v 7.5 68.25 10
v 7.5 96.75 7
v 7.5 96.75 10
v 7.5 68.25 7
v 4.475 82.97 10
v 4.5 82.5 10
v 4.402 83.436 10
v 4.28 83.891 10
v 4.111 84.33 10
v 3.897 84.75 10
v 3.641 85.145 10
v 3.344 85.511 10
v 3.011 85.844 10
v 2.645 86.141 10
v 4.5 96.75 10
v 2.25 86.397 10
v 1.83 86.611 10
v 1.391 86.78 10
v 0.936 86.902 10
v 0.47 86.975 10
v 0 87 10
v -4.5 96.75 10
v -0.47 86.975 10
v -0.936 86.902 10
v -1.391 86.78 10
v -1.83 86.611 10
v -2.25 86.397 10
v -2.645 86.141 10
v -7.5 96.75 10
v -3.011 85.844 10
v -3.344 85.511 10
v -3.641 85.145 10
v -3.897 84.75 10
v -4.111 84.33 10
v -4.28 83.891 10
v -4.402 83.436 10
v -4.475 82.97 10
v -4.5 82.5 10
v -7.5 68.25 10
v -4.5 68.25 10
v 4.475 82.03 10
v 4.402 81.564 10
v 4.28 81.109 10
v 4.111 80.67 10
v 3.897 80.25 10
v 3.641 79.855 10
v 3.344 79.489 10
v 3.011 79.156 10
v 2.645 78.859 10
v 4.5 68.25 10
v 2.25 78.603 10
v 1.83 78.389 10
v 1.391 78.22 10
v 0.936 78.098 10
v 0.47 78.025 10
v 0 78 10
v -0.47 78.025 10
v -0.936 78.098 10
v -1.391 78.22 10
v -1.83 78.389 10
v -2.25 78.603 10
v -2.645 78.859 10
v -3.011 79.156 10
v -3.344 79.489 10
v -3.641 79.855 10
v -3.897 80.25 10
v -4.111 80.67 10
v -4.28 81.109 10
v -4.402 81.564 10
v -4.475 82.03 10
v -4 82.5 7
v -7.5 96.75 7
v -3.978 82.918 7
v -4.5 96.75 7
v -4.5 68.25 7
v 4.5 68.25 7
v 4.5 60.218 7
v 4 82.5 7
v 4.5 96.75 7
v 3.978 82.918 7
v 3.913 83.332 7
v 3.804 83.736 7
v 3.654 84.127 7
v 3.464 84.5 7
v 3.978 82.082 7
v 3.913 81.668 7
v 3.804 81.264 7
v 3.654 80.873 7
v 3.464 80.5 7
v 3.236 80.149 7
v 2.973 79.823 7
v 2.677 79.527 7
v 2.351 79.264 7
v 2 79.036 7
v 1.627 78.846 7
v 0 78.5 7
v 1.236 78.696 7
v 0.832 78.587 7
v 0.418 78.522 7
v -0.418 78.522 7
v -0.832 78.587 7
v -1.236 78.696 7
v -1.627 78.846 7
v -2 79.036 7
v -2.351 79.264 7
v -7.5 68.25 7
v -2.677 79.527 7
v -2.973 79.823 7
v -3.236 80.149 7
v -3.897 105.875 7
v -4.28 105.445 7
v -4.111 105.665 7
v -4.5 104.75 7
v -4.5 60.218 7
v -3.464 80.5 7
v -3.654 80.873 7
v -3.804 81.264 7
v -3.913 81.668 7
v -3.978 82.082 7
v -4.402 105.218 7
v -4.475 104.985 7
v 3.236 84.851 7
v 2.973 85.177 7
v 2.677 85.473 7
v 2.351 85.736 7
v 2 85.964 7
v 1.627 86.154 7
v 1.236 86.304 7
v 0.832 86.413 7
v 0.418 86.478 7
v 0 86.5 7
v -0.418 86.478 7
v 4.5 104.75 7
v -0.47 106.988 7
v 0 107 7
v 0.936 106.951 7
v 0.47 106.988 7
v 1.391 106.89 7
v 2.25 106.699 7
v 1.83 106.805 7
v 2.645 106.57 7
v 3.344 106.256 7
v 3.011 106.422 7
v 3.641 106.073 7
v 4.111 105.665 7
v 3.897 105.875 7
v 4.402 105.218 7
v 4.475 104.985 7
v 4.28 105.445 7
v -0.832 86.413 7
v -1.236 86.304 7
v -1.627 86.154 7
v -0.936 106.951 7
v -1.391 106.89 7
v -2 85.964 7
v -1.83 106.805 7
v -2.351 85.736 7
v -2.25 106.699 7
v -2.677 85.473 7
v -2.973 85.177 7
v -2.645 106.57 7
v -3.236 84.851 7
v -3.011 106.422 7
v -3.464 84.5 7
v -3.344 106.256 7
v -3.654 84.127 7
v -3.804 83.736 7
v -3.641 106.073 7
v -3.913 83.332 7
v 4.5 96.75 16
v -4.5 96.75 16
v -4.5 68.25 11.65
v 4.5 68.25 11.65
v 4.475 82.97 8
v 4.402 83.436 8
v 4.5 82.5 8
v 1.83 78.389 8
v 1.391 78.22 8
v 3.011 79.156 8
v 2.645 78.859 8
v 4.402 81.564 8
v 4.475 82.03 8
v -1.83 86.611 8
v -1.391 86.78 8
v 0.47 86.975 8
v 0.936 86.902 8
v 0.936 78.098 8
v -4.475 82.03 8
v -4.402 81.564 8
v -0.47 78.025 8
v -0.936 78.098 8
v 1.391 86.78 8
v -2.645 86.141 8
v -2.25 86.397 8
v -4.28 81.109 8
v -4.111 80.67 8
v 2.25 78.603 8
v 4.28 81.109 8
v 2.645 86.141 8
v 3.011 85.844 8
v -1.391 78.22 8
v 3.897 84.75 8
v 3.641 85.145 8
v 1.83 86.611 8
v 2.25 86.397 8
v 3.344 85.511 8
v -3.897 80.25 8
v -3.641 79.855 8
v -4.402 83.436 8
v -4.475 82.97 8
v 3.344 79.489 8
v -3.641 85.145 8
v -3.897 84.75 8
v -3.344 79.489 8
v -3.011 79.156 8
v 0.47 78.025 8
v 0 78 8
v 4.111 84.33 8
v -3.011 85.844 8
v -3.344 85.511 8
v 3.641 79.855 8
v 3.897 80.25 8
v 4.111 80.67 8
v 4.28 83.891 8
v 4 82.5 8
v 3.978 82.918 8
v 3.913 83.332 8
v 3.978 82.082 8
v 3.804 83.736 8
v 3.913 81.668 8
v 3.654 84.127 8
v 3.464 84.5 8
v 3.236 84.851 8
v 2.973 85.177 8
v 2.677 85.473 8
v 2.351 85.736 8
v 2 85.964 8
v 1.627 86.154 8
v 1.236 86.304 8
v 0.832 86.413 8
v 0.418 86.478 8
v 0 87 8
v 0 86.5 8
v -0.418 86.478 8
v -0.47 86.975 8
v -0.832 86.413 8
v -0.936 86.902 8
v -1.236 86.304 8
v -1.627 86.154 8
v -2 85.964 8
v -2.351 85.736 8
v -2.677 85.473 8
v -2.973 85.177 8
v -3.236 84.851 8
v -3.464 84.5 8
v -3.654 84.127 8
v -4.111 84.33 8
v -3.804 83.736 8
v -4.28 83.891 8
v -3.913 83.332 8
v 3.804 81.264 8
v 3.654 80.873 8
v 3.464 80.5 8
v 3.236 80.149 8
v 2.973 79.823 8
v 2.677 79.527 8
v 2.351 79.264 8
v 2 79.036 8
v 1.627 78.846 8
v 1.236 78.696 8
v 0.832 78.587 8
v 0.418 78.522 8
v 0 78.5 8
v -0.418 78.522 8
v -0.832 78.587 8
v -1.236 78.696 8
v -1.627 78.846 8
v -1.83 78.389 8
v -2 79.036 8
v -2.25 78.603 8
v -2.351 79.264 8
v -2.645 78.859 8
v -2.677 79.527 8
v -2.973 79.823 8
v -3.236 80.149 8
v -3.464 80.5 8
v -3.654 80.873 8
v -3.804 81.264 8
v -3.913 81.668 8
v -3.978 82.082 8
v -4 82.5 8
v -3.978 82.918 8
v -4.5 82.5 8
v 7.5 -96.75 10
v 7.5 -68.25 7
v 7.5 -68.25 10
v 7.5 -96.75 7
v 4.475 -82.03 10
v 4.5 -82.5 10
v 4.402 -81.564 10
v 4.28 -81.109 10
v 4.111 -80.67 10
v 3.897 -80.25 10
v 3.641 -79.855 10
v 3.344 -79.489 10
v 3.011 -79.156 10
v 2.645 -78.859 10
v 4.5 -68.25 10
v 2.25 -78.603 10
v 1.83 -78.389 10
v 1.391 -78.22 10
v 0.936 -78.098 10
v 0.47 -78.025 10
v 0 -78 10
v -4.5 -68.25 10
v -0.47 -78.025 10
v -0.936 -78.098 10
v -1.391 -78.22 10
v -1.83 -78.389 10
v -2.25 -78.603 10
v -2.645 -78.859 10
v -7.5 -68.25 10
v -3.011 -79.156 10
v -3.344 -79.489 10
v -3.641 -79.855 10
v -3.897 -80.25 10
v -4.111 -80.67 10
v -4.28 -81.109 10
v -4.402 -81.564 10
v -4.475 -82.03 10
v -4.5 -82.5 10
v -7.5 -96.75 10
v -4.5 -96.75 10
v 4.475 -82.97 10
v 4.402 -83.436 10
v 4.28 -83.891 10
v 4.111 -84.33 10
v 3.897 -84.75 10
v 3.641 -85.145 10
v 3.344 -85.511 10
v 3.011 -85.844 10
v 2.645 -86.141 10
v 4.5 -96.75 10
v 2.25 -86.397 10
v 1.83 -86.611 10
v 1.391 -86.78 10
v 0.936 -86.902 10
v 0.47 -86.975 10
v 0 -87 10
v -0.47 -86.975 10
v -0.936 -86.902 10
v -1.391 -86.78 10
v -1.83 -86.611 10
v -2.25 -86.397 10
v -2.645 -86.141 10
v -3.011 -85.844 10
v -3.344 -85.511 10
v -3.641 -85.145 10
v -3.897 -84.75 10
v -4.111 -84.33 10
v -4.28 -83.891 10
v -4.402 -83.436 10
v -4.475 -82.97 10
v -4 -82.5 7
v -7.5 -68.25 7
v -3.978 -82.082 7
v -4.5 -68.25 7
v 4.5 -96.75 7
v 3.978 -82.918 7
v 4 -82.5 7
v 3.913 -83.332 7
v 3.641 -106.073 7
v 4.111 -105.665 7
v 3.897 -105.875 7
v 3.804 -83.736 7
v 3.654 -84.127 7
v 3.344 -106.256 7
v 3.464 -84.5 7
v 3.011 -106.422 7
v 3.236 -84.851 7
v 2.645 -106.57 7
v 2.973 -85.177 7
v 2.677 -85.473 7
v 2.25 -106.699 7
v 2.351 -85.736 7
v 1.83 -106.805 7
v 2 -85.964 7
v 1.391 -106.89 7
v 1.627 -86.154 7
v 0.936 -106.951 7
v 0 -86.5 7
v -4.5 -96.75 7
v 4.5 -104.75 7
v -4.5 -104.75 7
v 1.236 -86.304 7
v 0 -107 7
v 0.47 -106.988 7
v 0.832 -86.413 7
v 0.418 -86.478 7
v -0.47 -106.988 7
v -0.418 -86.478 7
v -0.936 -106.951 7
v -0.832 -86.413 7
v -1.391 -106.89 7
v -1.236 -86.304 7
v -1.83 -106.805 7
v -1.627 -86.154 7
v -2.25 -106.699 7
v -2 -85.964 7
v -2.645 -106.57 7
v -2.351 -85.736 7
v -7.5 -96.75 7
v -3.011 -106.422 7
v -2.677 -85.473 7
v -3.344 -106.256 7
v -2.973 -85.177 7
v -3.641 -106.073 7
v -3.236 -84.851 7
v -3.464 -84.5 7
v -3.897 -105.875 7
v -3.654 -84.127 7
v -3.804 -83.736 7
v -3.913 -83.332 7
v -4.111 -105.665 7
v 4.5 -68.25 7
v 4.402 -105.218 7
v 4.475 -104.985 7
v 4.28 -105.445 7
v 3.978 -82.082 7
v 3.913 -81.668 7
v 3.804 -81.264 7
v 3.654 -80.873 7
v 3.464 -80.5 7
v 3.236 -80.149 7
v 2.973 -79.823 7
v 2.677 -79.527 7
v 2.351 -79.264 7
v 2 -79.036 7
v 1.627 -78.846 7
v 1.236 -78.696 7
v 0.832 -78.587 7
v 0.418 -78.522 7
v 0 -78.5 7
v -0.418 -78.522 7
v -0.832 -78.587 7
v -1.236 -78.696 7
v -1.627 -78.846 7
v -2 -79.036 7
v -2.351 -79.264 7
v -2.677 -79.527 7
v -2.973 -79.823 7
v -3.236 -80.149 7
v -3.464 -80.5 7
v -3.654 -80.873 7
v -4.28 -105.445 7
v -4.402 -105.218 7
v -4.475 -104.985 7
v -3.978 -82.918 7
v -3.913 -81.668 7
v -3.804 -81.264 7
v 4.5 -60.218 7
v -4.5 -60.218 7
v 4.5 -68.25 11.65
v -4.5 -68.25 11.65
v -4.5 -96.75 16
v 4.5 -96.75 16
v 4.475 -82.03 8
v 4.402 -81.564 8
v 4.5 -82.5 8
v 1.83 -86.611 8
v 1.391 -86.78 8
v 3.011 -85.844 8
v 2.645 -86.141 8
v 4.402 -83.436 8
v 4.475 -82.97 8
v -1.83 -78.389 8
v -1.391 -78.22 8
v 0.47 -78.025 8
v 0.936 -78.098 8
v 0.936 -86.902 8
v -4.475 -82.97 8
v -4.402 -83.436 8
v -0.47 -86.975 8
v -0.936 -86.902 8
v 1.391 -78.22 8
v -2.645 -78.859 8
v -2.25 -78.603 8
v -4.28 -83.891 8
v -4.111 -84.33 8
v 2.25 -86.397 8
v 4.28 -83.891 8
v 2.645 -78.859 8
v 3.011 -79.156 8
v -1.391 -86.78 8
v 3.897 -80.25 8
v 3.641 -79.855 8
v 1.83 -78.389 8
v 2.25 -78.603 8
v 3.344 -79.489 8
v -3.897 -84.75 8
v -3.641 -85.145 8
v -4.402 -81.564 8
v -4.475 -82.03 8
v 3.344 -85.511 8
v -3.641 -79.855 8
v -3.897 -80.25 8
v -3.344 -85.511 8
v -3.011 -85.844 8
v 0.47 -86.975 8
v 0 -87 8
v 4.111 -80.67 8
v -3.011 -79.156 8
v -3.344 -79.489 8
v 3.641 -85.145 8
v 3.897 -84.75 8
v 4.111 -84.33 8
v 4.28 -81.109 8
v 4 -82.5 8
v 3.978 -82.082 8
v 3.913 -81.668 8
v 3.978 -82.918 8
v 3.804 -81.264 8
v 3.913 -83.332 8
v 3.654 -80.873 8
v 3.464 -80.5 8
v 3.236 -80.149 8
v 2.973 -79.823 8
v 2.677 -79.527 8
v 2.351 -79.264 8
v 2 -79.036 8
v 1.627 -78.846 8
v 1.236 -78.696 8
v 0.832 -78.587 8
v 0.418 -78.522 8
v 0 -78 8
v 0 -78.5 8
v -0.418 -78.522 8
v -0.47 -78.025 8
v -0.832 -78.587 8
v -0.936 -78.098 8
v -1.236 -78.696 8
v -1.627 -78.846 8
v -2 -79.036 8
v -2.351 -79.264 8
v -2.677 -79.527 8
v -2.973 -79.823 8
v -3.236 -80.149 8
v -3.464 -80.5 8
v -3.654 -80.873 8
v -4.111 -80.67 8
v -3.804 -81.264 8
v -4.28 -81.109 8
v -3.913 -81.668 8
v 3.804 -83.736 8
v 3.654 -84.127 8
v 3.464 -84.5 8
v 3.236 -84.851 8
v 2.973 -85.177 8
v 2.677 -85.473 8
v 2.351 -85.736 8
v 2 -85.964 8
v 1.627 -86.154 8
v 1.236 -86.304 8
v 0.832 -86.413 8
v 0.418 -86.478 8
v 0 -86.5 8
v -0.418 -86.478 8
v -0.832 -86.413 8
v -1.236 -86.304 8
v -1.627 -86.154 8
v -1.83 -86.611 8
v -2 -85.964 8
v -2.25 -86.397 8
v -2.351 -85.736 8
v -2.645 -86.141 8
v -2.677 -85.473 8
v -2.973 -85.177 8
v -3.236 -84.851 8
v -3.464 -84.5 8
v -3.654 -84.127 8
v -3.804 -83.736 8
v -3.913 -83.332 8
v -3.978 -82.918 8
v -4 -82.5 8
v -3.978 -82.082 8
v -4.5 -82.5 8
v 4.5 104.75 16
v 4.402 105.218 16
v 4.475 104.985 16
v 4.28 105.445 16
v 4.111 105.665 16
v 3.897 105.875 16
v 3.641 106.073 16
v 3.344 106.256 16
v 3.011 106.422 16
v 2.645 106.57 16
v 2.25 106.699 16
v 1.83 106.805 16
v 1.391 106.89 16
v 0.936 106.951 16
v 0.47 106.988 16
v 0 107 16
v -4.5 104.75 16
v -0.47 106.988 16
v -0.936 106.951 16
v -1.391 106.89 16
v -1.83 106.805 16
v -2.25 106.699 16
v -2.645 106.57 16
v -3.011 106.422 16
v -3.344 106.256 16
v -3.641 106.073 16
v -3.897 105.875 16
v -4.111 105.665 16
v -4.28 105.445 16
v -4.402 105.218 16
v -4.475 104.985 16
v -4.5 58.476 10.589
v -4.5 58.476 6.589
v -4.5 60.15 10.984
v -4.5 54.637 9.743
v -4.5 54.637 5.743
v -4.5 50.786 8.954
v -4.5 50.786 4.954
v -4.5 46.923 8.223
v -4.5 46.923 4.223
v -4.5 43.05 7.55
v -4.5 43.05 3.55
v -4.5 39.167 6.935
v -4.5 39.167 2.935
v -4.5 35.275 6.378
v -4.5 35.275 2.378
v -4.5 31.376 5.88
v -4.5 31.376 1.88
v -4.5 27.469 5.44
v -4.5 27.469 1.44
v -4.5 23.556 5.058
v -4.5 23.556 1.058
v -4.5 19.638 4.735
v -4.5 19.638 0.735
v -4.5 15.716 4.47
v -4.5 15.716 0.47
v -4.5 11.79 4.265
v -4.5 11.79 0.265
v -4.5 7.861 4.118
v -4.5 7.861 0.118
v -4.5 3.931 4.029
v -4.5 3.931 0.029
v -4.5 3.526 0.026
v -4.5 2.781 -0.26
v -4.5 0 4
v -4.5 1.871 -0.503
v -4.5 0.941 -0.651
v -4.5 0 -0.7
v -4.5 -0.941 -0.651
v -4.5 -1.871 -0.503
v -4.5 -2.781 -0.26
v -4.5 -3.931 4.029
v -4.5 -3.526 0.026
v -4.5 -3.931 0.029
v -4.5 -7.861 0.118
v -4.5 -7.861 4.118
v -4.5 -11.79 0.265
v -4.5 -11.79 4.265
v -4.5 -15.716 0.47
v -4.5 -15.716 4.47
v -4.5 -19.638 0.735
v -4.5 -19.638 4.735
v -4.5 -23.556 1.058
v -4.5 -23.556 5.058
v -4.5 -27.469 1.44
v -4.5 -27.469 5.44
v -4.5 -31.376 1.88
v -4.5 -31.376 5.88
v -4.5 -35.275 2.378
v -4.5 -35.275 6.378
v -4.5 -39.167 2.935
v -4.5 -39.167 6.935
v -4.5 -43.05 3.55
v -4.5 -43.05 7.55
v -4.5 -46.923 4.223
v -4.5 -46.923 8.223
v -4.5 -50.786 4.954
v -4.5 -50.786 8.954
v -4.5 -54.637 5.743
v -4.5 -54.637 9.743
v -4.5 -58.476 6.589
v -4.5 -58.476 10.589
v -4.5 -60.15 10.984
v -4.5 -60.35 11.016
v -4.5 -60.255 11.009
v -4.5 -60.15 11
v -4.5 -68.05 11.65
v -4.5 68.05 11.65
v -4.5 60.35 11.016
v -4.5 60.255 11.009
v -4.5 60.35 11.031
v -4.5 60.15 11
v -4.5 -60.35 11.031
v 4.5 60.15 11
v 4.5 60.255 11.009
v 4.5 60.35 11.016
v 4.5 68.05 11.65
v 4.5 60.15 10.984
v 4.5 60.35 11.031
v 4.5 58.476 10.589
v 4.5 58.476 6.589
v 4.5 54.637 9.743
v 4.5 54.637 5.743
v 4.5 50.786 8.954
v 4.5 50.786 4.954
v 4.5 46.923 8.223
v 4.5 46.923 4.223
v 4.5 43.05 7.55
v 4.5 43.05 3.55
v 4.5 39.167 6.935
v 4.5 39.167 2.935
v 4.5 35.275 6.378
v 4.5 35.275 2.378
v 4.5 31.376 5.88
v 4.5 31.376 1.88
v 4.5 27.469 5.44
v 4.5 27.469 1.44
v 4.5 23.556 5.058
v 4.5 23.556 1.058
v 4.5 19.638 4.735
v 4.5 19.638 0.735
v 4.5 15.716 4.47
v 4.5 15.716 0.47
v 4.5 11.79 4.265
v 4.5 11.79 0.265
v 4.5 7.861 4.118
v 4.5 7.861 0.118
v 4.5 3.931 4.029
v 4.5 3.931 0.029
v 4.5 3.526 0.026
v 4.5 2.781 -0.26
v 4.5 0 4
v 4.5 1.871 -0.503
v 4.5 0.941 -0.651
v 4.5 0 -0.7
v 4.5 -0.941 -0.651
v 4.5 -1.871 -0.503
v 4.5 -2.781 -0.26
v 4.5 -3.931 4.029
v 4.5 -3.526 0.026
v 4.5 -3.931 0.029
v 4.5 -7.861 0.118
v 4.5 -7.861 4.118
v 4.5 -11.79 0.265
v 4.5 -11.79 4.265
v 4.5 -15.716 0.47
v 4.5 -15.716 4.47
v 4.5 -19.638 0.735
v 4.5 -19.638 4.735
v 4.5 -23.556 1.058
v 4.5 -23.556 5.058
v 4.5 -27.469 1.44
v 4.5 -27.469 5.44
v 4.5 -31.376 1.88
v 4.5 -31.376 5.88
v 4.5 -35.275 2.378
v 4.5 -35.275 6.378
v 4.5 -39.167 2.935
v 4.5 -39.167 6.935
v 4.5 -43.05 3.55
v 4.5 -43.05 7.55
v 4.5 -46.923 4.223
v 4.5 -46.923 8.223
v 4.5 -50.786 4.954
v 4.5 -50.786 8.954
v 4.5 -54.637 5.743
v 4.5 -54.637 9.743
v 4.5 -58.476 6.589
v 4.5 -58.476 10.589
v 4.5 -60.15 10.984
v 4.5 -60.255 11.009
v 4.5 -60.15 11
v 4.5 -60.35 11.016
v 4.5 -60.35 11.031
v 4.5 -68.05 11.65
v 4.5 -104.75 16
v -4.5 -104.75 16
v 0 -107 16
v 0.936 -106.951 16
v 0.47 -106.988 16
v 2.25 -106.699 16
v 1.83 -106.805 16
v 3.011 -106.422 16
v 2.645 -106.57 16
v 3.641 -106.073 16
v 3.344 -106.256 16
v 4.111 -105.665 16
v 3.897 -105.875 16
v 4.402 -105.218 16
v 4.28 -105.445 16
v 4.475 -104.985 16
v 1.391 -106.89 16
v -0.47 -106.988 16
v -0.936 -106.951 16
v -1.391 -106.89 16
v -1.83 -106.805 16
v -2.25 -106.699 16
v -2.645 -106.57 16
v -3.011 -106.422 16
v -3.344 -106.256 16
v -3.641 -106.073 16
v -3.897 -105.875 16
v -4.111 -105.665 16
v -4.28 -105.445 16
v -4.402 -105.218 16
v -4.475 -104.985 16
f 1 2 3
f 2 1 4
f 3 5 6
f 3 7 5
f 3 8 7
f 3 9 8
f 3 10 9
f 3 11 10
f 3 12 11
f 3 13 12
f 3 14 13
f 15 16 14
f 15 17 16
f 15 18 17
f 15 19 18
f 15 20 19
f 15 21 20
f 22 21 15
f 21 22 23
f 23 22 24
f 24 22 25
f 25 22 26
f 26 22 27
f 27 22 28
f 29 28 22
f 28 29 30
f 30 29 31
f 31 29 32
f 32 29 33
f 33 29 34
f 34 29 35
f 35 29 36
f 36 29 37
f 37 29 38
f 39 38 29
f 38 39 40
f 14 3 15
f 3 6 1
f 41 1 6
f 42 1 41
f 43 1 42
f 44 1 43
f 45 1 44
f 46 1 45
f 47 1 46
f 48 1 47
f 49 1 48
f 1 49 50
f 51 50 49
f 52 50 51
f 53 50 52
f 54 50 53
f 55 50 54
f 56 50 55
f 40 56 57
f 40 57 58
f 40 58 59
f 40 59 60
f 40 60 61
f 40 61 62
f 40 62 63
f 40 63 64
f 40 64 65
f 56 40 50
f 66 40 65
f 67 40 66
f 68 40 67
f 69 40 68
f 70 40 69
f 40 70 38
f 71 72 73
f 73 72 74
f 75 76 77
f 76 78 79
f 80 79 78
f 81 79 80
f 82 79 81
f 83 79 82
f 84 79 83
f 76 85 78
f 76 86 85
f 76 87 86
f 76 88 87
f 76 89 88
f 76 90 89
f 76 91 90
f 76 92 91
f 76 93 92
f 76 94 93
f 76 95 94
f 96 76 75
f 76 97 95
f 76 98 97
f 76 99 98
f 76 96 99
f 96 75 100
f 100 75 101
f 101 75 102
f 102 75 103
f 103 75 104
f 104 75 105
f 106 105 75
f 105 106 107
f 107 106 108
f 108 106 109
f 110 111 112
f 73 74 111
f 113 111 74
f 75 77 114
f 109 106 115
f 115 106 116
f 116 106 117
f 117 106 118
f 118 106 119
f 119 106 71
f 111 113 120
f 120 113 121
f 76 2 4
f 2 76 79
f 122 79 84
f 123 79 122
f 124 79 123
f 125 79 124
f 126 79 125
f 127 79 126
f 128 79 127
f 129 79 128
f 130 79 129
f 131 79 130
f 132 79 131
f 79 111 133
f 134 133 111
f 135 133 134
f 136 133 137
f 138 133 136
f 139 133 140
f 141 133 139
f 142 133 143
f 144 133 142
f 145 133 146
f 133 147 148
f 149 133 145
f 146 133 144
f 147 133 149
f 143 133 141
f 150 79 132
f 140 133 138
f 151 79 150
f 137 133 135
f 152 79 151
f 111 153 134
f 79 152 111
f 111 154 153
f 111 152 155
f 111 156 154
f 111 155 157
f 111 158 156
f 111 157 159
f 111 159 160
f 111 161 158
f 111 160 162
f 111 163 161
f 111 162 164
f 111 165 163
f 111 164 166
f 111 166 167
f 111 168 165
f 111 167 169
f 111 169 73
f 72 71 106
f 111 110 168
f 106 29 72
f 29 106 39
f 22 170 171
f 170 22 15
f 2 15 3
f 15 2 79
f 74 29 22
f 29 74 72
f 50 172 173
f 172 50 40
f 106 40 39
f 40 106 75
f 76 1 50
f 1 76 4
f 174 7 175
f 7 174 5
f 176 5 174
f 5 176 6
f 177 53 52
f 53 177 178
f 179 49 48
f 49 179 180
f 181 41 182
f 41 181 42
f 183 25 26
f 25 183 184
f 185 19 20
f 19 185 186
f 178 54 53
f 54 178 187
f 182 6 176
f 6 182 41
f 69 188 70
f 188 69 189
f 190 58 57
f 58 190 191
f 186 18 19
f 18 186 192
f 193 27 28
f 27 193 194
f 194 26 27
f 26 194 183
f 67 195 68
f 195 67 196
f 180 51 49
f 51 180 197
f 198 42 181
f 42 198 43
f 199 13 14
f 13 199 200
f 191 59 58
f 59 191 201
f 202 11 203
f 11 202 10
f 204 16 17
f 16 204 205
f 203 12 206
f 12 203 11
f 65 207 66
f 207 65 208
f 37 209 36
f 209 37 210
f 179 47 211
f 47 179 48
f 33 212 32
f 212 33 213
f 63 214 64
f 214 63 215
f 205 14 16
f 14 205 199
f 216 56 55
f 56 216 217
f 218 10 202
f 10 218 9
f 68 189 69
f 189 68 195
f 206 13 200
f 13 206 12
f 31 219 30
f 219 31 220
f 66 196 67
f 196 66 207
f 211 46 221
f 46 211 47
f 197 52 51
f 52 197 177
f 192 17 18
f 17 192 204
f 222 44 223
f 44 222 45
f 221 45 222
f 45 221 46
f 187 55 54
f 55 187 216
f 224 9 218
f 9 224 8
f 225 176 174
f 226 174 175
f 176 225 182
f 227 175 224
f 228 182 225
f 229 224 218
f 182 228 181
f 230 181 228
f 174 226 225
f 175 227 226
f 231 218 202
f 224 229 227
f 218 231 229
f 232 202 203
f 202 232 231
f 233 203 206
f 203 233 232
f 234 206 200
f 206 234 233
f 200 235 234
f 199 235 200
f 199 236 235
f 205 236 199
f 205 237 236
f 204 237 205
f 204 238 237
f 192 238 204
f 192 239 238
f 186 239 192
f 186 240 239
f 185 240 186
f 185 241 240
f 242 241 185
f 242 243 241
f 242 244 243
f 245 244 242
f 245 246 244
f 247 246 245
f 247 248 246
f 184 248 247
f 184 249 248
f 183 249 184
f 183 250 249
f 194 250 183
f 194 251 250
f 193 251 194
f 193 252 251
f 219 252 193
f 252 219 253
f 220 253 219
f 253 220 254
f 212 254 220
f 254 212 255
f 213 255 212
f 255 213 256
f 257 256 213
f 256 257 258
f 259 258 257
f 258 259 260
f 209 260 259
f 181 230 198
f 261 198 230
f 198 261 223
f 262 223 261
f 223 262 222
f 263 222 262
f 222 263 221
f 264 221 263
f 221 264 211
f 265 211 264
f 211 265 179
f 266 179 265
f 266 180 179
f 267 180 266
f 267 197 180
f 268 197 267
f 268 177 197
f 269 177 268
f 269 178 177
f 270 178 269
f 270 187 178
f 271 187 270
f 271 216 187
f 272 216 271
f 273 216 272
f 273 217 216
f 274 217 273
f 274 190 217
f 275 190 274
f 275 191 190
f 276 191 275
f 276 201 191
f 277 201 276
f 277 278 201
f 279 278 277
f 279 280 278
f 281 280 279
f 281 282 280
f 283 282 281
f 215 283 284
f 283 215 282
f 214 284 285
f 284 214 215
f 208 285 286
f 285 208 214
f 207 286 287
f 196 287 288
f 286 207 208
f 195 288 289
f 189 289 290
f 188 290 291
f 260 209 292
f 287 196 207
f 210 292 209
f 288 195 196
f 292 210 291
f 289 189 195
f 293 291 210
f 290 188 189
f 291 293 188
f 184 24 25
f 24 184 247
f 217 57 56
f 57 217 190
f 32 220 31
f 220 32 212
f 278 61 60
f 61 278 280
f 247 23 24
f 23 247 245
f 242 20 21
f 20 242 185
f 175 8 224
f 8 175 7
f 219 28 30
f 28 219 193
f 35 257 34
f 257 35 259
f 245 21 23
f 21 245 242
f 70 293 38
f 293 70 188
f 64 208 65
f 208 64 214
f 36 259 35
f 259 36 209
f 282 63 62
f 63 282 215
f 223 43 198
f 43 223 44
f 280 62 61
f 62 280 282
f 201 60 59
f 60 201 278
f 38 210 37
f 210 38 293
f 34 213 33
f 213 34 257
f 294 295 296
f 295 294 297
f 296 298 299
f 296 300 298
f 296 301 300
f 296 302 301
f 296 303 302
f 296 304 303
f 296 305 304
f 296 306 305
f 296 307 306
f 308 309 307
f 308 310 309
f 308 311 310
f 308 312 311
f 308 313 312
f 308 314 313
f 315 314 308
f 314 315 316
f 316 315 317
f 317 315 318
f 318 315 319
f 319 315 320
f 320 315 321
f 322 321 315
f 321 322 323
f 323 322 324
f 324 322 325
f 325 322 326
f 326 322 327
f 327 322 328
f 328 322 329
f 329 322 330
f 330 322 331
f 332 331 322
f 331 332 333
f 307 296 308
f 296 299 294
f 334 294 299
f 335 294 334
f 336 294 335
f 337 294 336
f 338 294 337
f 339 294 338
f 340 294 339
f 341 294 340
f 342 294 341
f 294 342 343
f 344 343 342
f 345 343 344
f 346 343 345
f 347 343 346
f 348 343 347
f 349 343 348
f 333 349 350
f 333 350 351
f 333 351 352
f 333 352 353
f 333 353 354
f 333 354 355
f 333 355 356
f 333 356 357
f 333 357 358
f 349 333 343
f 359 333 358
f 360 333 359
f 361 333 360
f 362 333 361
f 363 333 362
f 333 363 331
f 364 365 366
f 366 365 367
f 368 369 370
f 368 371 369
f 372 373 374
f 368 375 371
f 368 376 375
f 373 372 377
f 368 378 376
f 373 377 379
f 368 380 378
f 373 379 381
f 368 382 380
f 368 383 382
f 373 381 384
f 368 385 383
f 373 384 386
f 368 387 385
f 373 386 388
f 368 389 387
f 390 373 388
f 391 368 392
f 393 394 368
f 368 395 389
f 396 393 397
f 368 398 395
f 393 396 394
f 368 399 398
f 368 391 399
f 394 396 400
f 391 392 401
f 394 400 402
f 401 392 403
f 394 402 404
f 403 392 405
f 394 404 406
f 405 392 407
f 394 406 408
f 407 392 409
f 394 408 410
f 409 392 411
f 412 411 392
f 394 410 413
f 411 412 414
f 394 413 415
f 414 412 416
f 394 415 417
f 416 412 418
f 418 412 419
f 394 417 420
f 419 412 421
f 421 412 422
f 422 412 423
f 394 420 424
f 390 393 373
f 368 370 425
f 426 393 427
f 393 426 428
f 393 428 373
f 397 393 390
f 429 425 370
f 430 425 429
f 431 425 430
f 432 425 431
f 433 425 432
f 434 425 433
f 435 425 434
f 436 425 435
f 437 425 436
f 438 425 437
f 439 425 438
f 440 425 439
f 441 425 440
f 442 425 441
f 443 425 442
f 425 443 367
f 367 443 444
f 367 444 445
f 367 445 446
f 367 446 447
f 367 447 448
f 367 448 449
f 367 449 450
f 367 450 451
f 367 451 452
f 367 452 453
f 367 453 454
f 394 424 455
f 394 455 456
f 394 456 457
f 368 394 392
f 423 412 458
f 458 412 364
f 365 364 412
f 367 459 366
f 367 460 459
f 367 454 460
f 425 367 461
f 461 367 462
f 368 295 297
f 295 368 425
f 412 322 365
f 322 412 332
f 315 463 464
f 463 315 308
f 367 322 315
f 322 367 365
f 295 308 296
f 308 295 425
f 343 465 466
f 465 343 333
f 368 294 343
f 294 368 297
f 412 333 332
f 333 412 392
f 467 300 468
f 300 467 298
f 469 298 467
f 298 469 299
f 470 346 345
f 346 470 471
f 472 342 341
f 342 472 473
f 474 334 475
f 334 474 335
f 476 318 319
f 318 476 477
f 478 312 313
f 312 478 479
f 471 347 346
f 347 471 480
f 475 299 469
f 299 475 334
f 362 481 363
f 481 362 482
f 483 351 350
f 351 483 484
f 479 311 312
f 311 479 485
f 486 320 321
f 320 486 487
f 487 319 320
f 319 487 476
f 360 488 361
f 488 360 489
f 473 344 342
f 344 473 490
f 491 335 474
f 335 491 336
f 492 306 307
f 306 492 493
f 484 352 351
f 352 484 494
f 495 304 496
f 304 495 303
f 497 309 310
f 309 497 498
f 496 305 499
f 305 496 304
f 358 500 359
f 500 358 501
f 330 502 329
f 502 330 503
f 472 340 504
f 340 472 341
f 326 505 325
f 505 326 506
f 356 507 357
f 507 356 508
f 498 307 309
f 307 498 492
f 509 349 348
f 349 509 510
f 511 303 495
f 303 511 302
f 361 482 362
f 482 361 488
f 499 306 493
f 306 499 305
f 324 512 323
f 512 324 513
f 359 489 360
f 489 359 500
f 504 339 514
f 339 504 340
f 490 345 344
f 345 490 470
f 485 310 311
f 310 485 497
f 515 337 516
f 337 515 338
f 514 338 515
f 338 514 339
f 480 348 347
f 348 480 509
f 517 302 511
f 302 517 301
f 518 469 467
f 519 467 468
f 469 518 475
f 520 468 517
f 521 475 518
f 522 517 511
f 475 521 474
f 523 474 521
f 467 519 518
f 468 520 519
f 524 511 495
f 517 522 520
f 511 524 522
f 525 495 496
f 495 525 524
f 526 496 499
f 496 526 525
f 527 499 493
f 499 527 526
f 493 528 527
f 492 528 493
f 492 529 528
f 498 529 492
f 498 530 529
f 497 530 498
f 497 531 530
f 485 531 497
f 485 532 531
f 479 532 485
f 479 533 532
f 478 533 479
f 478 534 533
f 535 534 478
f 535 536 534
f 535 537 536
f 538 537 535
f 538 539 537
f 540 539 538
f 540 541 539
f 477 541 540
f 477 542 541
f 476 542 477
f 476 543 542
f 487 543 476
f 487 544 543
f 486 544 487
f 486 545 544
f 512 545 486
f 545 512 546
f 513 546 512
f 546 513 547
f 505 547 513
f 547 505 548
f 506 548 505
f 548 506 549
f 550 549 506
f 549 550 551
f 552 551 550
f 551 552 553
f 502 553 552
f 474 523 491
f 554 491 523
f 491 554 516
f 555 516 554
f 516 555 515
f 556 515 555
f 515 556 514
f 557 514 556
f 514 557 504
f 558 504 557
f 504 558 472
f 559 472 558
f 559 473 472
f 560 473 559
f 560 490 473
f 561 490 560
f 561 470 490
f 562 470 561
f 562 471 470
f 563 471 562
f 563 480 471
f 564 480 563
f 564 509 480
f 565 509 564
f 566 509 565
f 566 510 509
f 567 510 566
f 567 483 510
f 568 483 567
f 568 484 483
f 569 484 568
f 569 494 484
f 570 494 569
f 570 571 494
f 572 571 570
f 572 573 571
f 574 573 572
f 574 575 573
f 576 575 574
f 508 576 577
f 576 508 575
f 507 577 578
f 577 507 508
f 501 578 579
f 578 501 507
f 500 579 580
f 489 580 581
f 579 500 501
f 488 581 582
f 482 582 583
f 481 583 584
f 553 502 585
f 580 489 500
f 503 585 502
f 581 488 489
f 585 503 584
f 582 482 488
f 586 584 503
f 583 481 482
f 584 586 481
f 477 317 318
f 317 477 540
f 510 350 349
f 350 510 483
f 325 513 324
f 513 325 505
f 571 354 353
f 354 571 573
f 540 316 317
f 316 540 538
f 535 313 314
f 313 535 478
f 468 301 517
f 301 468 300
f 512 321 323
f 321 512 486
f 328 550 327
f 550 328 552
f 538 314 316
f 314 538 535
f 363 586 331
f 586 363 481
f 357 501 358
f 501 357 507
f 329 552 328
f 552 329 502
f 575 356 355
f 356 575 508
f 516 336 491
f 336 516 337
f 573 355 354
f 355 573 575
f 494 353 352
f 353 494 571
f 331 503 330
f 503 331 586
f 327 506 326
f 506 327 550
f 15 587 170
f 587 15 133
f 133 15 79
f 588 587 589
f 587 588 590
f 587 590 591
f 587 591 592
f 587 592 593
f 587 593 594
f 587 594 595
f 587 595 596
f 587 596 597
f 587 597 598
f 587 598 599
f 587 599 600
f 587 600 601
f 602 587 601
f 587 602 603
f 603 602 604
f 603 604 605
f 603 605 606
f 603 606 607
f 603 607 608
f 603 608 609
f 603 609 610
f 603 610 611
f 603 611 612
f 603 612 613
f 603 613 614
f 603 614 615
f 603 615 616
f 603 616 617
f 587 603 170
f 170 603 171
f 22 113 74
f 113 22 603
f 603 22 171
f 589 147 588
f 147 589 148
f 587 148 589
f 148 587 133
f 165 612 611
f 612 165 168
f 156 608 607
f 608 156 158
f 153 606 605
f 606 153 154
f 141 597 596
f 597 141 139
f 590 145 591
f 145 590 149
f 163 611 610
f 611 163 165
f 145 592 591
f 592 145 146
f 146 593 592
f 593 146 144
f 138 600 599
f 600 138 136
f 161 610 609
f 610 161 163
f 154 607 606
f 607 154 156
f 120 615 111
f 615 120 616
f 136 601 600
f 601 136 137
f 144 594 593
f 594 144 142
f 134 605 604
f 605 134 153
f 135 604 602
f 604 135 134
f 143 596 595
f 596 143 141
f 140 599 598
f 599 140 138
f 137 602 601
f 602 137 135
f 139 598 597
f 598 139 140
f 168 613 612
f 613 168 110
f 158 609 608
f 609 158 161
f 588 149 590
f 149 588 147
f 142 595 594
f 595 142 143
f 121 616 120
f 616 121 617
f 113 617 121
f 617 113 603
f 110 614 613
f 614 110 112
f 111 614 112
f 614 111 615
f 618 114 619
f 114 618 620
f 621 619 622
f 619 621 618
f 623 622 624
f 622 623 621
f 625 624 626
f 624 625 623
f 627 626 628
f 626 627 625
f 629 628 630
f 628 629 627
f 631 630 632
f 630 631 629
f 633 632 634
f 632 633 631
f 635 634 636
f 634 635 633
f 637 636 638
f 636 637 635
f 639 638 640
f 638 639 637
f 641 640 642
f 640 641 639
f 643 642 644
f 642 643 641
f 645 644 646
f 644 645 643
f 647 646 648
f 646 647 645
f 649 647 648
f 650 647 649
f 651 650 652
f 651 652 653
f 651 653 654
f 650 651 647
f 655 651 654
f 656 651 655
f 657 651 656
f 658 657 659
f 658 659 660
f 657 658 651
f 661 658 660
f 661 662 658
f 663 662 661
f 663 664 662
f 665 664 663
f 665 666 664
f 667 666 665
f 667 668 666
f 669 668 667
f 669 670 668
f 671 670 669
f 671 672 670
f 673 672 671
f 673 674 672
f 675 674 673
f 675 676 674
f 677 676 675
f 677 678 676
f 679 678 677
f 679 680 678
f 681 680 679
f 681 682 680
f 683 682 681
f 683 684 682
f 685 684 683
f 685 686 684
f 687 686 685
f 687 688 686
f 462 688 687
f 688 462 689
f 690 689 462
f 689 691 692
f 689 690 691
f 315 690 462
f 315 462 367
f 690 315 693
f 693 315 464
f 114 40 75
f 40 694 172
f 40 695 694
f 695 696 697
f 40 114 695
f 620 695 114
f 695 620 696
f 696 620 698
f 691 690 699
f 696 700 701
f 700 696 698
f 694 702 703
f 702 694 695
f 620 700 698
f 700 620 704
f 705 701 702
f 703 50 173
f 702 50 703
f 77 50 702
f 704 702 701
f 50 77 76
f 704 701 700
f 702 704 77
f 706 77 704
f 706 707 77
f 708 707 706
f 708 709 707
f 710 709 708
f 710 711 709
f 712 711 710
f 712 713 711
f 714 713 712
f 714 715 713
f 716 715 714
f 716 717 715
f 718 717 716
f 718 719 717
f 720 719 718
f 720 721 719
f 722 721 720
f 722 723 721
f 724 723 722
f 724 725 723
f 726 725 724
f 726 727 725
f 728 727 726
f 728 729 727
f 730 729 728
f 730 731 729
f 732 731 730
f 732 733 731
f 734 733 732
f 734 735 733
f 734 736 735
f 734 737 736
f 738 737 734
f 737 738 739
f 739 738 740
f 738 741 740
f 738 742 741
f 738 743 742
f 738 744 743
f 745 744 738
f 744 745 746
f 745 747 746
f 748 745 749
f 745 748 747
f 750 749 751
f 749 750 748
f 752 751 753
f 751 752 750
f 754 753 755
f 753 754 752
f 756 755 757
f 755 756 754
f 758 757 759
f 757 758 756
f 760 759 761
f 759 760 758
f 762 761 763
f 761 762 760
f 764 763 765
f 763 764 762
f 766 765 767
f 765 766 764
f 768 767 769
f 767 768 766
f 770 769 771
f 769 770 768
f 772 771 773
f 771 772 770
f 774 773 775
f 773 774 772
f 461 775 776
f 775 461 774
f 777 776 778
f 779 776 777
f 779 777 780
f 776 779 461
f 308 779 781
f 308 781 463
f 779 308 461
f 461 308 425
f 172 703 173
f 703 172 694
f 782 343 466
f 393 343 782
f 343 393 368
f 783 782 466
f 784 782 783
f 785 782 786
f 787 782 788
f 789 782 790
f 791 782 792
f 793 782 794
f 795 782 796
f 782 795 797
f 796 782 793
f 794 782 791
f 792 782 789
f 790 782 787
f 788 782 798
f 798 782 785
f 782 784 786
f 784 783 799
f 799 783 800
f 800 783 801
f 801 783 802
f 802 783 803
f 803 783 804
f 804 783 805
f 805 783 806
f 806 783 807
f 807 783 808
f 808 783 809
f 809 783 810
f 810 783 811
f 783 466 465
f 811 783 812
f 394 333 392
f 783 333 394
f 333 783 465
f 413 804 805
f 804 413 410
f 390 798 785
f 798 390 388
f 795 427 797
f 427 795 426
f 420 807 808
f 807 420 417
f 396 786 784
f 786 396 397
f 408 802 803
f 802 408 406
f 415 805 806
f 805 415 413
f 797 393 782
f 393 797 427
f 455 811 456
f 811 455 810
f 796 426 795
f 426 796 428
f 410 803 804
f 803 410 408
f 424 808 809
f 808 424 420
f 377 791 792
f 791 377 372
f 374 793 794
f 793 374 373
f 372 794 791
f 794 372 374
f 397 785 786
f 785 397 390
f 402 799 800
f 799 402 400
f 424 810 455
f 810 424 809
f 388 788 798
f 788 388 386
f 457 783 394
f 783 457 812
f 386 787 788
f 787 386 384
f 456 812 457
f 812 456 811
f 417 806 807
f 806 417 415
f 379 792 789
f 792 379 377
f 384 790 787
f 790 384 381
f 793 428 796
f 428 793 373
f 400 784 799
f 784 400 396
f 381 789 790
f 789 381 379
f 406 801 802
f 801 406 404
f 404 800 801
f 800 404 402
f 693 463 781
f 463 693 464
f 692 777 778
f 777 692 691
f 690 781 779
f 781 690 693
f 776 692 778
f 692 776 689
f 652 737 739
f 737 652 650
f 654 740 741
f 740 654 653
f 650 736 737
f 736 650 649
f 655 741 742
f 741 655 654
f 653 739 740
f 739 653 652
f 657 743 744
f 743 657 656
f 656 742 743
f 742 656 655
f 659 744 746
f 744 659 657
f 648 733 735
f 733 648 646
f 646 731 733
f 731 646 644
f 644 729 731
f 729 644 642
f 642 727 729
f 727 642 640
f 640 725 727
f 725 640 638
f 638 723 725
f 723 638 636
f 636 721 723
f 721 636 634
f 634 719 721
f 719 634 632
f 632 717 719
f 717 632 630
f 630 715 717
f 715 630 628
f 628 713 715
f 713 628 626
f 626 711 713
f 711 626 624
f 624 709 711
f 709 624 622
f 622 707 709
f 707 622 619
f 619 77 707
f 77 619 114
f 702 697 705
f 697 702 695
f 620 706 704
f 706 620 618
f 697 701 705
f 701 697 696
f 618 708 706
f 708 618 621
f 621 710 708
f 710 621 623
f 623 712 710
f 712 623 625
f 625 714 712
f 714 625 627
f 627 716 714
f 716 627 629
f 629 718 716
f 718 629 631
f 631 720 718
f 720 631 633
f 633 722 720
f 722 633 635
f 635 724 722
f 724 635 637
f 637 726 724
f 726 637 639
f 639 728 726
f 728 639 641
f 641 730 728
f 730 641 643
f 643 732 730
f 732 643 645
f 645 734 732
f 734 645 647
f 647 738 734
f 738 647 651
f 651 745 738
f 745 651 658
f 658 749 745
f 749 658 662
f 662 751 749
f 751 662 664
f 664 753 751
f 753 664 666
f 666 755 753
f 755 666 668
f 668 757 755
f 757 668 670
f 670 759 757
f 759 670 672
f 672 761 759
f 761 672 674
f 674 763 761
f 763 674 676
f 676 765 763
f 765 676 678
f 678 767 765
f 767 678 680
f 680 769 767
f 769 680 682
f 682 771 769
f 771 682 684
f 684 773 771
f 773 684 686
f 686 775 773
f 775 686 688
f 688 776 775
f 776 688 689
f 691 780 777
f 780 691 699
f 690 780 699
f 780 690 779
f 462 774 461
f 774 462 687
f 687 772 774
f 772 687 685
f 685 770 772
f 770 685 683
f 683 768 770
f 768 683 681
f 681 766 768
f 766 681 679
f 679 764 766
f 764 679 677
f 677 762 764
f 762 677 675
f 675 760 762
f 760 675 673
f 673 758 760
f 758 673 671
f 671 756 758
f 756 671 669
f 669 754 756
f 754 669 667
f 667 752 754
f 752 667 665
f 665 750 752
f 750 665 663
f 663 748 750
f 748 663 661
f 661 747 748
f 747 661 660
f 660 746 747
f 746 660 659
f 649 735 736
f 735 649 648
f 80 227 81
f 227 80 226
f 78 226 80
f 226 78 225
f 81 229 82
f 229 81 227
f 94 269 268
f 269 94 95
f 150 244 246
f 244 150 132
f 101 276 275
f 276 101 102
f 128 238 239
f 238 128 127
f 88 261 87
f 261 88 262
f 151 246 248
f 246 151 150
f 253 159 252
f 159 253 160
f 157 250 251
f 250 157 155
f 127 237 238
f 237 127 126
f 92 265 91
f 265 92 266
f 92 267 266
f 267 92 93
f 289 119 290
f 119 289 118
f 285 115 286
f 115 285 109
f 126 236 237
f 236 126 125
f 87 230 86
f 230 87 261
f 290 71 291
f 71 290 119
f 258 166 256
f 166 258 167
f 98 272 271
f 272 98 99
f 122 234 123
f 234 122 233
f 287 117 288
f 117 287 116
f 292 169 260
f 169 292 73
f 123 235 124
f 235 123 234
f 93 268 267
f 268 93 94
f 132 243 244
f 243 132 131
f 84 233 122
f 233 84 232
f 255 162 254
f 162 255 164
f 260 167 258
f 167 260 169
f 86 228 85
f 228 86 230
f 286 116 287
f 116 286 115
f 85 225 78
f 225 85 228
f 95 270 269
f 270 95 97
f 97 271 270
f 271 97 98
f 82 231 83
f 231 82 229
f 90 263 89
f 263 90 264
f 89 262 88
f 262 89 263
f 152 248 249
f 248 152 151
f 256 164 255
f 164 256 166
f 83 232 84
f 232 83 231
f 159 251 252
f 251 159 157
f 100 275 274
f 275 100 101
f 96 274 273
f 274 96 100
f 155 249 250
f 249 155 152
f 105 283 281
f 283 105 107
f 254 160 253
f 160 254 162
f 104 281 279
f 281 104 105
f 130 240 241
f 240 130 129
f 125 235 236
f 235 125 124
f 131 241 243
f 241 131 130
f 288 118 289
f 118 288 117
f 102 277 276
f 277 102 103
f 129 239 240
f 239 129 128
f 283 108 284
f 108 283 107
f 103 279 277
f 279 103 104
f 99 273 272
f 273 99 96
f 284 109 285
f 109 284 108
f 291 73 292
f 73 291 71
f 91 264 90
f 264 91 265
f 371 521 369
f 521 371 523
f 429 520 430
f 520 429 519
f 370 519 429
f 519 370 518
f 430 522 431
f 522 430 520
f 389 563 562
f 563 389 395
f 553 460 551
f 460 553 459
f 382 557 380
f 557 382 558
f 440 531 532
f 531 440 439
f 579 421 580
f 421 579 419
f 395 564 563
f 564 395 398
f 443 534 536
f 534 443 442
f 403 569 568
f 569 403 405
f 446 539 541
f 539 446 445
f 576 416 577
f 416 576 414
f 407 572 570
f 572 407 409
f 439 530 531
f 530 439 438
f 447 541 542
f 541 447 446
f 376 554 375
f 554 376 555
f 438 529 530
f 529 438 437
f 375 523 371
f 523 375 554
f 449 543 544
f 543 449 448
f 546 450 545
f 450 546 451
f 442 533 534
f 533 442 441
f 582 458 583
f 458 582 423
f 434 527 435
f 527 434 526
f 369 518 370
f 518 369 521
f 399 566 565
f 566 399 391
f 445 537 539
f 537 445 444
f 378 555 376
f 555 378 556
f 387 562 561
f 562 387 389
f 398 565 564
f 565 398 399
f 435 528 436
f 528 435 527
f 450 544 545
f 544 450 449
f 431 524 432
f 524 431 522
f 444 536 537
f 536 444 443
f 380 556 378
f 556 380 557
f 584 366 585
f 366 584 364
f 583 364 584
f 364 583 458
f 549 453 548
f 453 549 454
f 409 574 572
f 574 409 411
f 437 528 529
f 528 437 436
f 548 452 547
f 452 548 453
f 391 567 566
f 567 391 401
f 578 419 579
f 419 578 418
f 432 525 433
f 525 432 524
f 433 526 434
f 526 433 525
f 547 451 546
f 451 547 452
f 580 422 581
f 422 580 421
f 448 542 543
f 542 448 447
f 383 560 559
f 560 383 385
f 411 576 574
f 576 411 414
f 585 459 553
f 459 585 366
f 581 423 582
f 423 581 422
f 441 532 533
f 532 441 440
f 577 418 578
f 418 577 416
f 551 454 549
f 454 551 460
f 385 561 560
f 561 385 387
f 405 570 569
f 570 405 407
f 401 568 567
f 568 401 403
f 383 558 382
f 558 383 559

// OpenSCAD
// Wing-Foil Mast Nut Spacer/Holder
// Version: 0.13

/* [General Settings] */
// Distance between bolt centers
nut_spacing = 165.0;

/* [Track & Nut Dimensions] */
shaft_width = 9.0;
nut_length = 28.5;
nut_thickness = 5.5;
bolt_hole_dia = 8.0;

/* [Holder Design Features] */
base_thickness = 3.0;
bridge_thickness = 4.0;
spring_bow = 7.0;
guide_height = 9.0;
stop_length = 8.0;

// The diameter of the cylinder used for the bottom bump
bottom_bump_dia = 18.0;
// Percent of the cylinder radius to protrude (0.3 = 30%)
bump_profile_percent = 0.3;
// Whether to include the bump
bump = true;

/* [Hidden] */
$fn = 60;
lip_thickness = base_thickness + nut_thickness * 0.3;

module extruded_bridge(w, span, t, bow, overlap=0.4) {
    R = (span*span)/(8*bow) + bow/2;
    rotate([90, 0, 90])
    linear_extrude(w, center=true)
    intersection() {
        translate([0, -bow])
            square([span + overlap, 2*R], center=true);
        translate([0, R - bow])
            difference() {
                // By translating the same circle vertically, we ensure the ends are flat
                // instead of being perpendicular to the curve.
                circle(r=R, $fn=420);
                translate([0, t]) circle(r=R, $fn=420);
            }
    }
}

module complete_spacer() {
    difference() {
        union() {
            for (dir = [1, -1]) {
                nut_y = dir * nut_spacing/2;

                // 1. Base platform (wider with circular cutout)
                platform_width = 15.0; // Width at center of the platform
                platform_depth = nut_length;
                platform_height = base_thickness;

                // Create a wider base with circular cutout at center
                translate([0, nut_y, platform_height/2])
                    difference() {
                        cube([platform_width, platform_depth, platform_height], center=true);
                        // Circular cutout at center
                        translate([0, 0, platform_height/2])
                            #cylinder(h=platform_height + 1, d=shaft_width, center=true);
                    }

                // 2. Outer Vertical Guide Wall (Centering)
                outer_pos = nut_y + dir * (nut_length/2 + stop_length/2);
                translate([0, outer_pos, guide_height/2])
                    cube([shaft_width, stop_length, guide_height], center=true);

                // Rounded tip
                extreme_end = nut_y + dir * (nut_length/2 + stop_length);
                translate([0, extreme_end, guide_height/2])
                    scale([1, 0.5, 1]) cylinder(h=guide_height, d=shaft_width, center=true);

                // 3. Inner Transition (Vertical wall + Slope)
                inner_start = nut_y - dir * nut_length/2;
                inner_end = inner_start - dir * stop_length;

                hull() {
                    translate([0, inner_start - dir*0.1, lip_thickness/2])
                        cube([shaft_width, 0.2, lip_thickness], center=true);
                    translate([0, inner_end, bridge_thickness/2])
                        cube([shaft_width, 0.2, bridge_thickness], center=true);
                }
            }

            // 4. Continuous Spring Bridge
            bridge_span = nut_spacing - nut_length - (stop_length * 2);
            extruded_bridge(w=shaft_width, span=bridge_span, t=bridge_thickness, bow=spring_bow, overlap=0.2);

            // 5. Recessed 30% Bump
            // Positioned so it is cut inside the body and only protrudes from the bottom
            if (bump) {
                bump_radius = bottom_bump_dia / 2;
                protrusion_height = bump_radius * bump_profile_percent;

                translate([0, 0, -spring_bow + bridge_thickness/2])
                intersection() {
                    // The Cylinder
                    translate([0, 0, bump_radius - protrusion_height])
                        rotate([0, 90, 0])
                        cylinder(h=shaft_width, d=bottom_bump_dia, center=true);

                    // The Shaving Cube: Limits the bump to the bridge's vertical volume
                    // This ensures the bump never pokes out the top of the bridge
                    translate([0, 0, -protrusion_height])
                        cube([shaft_width + 1, bottom_bump_dia, bridge_thickness + protrusion_height * 2], center=true);
                }
            }
        }

        // Bolt holes
        for (dir = [1, -1]) {
            nut_y = dir * nut_spacing/2;
            translate([0, nut_y, -1])
                cylinder(h=guide_height + 20, d=bolt_hole_dia);
        }
    }
}

// Final assembly positioning
translate([0, 0, spring_bow])
    complete_spacer();
